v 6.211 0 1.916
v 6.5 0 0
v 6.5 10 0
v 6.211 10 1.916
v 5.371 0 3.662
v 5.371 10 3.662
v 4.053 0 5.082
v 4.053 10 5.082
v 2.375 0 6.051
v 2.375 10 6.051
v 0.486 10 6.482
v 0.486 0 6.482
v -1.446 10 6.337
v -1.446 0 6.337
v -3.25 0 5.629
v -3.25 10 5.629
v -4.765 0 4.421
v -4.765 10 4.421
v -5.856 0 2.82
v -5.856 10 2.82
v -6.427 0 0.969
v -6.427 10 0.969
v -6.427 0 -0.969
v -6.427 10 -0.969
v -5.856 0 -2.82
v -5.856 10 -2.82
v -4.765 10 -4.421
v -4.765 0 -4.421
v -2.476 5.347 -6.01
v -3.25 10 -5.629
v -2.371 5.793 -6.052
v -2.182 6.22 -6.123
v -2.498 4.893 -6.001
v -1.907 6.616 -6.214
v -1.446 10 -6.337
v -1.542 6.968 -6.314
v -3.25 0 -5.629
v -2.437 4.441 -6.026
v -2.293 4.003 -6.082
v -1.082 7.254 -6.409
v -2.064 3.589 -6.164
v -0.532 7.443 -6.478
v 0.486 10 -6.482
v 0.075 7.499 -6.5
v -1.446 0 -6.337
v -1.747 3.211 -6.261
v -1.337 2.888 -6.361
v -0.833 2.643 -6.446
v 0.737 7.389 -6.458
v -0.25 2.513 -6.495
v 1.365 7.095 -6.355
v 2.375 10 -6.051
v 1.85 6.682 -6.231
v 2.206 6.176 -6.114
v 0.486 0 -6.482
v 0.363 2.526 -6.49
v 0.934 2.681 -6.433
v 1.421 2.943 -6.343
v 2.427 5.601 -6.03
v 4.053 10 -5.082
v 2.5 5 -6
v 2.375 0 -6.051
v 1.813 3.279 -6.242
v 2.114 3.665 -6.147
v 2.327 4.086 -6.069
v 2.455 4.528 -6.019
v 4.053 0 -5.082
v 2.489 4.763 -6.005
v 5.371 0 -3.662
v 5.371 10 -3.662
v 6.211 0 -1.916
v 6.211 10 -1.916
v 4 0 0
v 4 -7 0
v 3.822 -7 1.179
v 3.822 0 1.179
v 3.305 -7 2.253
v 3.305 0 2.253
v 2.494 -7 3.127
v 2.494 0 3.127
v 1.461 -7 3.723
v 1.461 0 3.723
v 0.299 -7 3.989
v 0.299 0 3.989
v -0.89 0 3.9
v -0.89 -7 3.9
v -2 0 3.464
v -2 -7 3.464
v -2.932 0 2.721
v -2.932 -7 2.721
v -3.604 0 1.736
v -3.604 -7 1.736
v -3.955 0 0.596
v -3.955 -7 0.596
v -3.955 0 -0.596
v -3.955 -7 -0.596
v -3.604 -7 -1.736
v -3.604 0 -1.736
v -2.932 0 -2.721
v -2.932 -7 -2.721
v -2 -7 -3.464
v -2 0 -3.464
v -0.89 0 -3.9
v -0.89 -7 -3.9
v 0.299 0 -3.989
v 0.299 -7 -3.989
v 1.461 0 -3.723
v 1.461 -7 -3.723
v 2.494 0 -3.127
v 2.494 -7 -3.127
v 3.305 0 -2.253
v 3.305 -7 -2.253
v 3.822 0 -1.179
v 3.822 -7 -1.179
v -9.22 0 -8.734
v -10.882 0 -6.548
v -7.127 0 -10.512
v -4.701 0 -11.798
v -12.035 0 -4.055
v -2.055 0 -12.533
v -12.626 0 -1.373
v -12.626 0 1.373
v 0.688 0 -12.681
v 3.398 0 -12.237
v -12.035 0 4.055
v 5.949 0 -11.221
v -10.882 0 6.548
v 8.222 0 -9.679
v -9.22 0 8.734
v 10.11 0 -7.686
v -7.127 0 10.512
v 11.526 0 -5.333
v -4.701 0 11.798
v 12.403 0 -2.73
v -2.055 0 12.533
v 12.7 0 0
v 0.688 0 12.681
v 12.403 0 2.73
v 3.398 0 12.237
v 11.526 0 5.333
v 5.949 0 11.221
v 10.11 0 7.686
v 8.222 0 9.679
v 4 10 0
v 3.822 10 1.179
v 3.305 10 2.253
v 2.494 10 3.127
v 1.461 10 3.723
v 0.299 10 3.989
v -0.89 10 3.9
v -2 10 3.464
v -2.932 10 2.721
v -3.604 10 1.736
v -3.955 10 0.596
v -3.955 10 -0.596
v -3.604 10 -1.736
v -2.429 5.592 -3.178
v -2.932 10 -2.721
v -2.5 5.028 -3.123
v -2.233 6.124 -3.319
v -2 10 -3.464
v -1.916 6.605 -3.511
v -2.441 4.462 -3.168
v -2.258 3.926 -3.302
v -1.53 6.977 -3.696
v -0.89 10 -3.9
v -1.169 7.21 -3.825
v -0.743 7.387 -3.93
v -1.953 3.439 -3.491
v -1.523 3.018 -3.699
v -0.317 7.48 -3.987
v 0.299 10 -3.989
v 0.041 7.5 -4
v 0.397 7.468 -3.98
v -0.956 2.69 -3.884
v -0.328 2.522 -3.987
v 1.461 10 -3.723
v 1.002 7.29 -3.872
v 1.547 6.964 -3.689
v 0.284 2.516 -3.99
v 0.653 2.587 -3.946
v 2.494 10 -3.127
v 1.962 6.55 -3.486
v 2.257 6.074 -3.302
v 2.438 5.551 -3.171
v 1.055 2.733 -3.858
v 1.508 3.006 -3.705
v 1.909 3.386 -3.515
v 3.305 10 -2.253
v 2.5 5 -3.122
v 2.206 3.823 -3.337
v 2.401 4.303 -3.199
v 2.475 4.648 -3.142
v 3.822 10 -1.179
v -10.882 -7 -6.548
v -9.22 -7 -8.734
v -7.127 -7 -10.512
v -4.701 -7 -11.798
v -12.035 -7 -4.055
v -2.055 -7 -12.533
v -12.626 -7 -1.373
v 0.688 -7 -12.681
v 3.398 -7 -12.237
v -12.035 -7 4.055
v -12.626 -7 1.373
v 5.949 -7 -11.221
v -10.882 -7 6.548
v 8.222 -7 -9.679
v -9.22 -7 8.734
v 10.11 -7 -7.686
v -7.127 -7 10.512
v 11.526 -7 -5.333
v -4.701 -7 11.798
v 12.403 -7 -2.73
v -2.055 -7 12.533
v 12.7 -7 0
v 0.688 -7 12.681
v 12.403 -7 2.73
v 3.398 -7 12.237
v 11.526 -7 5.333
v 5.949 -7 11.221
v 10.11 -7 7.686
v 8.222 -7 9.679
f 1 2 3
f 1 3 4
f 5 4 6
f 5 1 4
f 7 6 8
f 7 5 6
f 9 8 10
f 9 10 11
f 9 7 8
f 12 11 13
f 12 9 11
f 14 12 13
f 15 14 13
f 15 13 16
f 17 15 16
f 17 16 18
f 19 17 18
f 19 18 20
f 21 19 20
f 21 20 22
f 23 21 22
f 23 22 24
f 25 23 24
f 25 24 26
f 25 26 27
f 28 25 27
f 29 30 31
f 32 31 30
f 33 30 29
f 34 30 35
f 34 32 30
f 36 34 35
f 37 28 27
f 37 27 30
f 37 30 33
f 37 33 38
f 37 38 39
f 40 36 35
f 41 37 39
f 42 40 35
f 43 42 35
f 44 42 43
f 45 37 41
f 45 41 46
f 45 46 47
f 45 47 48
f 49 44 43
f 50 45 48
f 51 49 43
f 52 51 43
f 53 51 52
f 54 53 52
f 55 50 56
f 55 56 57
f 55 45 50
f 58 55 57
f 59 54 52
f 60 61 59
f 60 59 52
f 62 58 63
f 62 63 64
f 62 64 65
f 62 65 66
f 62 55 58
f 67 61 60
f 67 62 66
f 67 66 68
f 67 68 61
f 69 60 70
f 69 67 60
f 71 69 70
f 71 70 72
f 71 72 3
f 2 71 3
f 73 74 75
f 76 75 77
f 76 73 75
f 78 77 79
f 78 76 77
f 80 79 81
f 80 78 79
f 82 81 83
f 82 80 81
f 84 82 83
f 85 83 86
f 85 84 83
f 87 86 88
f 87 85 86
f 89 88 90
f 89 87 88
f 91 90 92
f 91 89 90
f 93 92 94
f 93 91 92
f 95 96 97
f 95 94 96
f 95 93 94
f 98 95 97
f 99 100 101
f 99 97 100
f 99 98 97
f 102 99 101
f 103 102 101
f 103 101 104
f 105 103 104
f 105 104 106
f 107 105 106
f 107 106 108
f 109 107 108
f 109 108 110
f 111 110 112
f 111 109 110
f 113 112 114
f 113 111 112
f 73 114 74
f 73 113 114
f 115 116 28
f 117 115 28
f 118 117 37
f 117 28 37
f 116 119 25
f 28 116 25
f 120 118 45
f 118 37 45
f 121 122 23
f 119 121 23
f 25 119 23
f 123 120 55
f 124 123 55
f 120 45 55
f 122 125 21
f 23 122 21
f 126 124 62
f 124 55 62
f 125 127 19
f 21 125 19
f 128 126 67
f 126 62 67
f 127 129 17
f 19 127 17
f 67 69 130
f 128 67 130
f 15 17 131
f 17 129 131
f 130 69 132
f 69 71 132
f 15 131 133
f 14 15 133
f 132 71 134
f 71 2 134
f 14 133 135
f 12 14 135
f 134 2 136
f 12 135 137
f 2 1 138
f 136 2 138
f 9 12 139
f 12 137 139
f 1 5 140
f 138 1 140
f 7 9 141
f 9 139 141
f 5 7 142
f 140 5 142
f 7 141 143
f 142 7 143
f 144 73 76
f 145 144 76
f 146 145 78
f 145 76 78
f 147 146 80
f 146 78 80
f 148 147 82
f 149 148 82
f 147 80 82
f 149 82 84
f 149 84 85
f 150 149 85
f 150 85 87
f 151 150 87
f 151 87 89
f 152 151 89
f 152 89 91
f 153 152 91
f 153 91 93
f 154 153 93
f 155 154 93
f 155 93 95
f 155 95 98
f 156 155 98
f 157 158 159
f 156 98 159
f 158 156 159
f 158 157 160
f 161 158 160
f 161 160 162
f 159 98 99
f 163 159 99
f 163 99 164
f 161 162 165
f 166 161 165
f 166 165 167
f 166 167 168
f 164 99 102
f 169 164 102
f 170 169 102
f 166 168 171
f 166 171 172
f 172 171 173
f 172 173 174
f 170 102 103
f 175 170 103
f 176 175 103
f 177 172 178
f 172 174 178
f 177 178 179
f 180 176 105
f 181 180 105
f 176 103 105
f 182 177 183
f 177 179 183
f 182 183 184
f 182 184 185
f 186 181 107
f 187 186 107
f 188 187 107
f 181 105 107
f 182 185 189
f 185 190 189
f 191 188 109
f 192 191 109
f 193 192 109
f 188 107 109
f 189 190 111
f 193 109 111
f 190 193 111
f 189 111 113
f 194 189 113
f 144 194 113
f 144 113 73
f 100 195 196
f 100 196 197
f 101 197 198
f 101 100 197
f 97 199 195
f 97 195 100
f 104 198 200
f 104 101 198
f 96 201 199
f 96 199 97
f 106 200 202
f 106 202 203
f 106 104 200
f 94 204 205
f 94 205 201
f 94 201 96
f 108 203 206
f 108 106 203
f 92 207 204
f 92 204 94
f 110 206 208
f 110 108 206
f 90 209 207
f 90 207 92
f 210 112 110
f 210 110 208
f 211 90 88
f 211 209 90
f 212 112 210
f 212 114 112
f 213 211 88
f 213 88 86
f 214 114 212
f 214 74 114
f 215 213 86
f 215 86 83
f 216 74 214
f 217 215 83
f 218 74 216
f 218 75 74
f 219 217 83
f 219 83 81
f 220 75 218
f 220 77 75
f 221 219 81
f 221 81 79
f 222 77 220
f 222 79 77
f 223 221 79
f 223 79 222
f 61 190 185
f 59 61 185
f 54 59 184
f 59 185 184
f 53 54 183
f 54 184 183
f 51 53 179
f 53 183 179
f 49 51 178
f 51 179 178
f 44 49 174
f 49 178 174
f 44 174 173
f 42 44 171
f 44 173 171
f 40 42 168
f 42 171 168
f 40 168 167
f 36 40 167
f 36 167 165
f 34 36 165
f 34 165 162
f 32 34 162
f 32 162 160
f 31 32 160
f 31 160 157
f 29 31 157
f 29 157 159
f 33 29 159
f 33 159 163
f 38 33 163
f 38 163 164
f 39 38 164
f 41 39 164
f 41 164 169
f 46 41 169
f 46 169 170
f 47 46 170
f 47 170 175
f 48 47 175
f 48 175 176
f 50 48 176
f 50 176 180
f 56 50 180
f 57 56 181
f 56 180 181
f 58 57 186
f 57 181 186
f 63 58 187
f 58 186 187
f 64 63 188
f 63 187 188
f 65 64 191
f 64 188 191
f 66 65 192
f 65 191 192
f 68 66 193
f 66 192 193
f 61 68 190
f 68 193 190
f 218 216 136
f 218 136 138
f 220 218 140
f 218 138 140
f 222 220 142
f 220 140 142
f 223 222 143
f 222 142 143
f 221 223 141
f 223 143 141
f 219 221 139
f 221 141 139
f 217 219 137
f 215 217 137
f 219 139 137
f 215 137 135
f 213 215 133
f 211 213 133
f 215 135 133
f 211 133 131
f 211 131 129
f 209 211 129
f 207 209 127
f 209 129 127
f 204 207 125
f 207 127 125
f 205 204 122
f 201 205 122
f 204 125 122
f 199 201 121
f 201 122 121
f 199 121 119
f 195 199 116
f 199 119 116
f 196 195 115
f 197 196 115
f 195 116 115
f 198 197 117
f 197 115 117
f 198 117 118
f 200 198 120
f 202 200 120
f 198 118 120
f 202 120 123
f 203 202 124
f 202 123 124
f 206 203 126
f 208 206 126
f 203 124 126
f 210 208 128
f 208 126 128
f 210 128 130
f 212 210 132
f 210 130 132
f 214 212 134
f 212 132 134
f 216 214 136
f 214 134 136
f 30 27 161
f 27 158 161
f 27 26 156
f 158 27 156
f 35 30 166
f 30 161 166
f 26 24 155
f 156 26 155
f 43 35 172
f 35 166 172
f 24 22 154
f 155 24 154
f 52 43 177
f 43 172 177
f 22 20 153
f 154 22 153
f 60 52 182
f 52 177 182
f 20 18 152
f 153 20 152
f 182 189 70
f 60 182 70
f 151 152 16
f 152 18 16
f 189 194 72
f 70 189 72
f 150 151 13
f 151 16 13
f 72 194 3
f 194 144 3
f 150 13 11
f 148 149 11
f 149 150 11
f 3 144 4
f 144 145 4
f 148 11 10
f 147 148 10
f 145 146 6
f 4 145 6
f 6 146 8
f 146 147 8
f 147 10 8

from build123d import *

# Parameters (mm, degrees)
F0_R     = 12.7
F1_DEPTH = 7
F2_R     = 6.5
F3_DEPTH = 10
F4_R     = 4
F5_DEPTH = 10.001
F6_DEPTH = 7.001
F8_D     = 5
F8_DEPTH = 12.701


with BuildPart() as f1:
    # F0 (on Front) → F1 (new body)
    with BuildSketch(Plane.XZ):
        Circle(F0_R)
    extrude(amount=F1_DEPTH)

    # F2 (on Front) → F3 (join)
    with BuildSketch(Plane.XZ):
        Circle(F2_R)
    extrude(amount=-F3_DEPTH)

    # F4 (on Front) → F5 (cut, through all)
    with BuildSketch(Plane.XZ):
        Circle(F4_R)
    extrude(amount=-F5_DEPTH, mode=Mode.SUBTRACT)

    # F6 (cut, through all): a face of the model
    f6_faces = [f1.faces().sort_by_distance(p)[0] for p in [
        (0, 0, 0),
    ]]
    extrude(f6_faces, amount=-F6_DEPTH, mode=Mode.SUBTRACT)

    # F8 (through all, one way)
    with BuildSketch(Plane.XY):
        with Locations((0, 5)):
            Circle(F8_D / 2)
    extrude(amount=-F8_DEPTH, mode=Mode.SUBTRACT)


solid = f1.part
